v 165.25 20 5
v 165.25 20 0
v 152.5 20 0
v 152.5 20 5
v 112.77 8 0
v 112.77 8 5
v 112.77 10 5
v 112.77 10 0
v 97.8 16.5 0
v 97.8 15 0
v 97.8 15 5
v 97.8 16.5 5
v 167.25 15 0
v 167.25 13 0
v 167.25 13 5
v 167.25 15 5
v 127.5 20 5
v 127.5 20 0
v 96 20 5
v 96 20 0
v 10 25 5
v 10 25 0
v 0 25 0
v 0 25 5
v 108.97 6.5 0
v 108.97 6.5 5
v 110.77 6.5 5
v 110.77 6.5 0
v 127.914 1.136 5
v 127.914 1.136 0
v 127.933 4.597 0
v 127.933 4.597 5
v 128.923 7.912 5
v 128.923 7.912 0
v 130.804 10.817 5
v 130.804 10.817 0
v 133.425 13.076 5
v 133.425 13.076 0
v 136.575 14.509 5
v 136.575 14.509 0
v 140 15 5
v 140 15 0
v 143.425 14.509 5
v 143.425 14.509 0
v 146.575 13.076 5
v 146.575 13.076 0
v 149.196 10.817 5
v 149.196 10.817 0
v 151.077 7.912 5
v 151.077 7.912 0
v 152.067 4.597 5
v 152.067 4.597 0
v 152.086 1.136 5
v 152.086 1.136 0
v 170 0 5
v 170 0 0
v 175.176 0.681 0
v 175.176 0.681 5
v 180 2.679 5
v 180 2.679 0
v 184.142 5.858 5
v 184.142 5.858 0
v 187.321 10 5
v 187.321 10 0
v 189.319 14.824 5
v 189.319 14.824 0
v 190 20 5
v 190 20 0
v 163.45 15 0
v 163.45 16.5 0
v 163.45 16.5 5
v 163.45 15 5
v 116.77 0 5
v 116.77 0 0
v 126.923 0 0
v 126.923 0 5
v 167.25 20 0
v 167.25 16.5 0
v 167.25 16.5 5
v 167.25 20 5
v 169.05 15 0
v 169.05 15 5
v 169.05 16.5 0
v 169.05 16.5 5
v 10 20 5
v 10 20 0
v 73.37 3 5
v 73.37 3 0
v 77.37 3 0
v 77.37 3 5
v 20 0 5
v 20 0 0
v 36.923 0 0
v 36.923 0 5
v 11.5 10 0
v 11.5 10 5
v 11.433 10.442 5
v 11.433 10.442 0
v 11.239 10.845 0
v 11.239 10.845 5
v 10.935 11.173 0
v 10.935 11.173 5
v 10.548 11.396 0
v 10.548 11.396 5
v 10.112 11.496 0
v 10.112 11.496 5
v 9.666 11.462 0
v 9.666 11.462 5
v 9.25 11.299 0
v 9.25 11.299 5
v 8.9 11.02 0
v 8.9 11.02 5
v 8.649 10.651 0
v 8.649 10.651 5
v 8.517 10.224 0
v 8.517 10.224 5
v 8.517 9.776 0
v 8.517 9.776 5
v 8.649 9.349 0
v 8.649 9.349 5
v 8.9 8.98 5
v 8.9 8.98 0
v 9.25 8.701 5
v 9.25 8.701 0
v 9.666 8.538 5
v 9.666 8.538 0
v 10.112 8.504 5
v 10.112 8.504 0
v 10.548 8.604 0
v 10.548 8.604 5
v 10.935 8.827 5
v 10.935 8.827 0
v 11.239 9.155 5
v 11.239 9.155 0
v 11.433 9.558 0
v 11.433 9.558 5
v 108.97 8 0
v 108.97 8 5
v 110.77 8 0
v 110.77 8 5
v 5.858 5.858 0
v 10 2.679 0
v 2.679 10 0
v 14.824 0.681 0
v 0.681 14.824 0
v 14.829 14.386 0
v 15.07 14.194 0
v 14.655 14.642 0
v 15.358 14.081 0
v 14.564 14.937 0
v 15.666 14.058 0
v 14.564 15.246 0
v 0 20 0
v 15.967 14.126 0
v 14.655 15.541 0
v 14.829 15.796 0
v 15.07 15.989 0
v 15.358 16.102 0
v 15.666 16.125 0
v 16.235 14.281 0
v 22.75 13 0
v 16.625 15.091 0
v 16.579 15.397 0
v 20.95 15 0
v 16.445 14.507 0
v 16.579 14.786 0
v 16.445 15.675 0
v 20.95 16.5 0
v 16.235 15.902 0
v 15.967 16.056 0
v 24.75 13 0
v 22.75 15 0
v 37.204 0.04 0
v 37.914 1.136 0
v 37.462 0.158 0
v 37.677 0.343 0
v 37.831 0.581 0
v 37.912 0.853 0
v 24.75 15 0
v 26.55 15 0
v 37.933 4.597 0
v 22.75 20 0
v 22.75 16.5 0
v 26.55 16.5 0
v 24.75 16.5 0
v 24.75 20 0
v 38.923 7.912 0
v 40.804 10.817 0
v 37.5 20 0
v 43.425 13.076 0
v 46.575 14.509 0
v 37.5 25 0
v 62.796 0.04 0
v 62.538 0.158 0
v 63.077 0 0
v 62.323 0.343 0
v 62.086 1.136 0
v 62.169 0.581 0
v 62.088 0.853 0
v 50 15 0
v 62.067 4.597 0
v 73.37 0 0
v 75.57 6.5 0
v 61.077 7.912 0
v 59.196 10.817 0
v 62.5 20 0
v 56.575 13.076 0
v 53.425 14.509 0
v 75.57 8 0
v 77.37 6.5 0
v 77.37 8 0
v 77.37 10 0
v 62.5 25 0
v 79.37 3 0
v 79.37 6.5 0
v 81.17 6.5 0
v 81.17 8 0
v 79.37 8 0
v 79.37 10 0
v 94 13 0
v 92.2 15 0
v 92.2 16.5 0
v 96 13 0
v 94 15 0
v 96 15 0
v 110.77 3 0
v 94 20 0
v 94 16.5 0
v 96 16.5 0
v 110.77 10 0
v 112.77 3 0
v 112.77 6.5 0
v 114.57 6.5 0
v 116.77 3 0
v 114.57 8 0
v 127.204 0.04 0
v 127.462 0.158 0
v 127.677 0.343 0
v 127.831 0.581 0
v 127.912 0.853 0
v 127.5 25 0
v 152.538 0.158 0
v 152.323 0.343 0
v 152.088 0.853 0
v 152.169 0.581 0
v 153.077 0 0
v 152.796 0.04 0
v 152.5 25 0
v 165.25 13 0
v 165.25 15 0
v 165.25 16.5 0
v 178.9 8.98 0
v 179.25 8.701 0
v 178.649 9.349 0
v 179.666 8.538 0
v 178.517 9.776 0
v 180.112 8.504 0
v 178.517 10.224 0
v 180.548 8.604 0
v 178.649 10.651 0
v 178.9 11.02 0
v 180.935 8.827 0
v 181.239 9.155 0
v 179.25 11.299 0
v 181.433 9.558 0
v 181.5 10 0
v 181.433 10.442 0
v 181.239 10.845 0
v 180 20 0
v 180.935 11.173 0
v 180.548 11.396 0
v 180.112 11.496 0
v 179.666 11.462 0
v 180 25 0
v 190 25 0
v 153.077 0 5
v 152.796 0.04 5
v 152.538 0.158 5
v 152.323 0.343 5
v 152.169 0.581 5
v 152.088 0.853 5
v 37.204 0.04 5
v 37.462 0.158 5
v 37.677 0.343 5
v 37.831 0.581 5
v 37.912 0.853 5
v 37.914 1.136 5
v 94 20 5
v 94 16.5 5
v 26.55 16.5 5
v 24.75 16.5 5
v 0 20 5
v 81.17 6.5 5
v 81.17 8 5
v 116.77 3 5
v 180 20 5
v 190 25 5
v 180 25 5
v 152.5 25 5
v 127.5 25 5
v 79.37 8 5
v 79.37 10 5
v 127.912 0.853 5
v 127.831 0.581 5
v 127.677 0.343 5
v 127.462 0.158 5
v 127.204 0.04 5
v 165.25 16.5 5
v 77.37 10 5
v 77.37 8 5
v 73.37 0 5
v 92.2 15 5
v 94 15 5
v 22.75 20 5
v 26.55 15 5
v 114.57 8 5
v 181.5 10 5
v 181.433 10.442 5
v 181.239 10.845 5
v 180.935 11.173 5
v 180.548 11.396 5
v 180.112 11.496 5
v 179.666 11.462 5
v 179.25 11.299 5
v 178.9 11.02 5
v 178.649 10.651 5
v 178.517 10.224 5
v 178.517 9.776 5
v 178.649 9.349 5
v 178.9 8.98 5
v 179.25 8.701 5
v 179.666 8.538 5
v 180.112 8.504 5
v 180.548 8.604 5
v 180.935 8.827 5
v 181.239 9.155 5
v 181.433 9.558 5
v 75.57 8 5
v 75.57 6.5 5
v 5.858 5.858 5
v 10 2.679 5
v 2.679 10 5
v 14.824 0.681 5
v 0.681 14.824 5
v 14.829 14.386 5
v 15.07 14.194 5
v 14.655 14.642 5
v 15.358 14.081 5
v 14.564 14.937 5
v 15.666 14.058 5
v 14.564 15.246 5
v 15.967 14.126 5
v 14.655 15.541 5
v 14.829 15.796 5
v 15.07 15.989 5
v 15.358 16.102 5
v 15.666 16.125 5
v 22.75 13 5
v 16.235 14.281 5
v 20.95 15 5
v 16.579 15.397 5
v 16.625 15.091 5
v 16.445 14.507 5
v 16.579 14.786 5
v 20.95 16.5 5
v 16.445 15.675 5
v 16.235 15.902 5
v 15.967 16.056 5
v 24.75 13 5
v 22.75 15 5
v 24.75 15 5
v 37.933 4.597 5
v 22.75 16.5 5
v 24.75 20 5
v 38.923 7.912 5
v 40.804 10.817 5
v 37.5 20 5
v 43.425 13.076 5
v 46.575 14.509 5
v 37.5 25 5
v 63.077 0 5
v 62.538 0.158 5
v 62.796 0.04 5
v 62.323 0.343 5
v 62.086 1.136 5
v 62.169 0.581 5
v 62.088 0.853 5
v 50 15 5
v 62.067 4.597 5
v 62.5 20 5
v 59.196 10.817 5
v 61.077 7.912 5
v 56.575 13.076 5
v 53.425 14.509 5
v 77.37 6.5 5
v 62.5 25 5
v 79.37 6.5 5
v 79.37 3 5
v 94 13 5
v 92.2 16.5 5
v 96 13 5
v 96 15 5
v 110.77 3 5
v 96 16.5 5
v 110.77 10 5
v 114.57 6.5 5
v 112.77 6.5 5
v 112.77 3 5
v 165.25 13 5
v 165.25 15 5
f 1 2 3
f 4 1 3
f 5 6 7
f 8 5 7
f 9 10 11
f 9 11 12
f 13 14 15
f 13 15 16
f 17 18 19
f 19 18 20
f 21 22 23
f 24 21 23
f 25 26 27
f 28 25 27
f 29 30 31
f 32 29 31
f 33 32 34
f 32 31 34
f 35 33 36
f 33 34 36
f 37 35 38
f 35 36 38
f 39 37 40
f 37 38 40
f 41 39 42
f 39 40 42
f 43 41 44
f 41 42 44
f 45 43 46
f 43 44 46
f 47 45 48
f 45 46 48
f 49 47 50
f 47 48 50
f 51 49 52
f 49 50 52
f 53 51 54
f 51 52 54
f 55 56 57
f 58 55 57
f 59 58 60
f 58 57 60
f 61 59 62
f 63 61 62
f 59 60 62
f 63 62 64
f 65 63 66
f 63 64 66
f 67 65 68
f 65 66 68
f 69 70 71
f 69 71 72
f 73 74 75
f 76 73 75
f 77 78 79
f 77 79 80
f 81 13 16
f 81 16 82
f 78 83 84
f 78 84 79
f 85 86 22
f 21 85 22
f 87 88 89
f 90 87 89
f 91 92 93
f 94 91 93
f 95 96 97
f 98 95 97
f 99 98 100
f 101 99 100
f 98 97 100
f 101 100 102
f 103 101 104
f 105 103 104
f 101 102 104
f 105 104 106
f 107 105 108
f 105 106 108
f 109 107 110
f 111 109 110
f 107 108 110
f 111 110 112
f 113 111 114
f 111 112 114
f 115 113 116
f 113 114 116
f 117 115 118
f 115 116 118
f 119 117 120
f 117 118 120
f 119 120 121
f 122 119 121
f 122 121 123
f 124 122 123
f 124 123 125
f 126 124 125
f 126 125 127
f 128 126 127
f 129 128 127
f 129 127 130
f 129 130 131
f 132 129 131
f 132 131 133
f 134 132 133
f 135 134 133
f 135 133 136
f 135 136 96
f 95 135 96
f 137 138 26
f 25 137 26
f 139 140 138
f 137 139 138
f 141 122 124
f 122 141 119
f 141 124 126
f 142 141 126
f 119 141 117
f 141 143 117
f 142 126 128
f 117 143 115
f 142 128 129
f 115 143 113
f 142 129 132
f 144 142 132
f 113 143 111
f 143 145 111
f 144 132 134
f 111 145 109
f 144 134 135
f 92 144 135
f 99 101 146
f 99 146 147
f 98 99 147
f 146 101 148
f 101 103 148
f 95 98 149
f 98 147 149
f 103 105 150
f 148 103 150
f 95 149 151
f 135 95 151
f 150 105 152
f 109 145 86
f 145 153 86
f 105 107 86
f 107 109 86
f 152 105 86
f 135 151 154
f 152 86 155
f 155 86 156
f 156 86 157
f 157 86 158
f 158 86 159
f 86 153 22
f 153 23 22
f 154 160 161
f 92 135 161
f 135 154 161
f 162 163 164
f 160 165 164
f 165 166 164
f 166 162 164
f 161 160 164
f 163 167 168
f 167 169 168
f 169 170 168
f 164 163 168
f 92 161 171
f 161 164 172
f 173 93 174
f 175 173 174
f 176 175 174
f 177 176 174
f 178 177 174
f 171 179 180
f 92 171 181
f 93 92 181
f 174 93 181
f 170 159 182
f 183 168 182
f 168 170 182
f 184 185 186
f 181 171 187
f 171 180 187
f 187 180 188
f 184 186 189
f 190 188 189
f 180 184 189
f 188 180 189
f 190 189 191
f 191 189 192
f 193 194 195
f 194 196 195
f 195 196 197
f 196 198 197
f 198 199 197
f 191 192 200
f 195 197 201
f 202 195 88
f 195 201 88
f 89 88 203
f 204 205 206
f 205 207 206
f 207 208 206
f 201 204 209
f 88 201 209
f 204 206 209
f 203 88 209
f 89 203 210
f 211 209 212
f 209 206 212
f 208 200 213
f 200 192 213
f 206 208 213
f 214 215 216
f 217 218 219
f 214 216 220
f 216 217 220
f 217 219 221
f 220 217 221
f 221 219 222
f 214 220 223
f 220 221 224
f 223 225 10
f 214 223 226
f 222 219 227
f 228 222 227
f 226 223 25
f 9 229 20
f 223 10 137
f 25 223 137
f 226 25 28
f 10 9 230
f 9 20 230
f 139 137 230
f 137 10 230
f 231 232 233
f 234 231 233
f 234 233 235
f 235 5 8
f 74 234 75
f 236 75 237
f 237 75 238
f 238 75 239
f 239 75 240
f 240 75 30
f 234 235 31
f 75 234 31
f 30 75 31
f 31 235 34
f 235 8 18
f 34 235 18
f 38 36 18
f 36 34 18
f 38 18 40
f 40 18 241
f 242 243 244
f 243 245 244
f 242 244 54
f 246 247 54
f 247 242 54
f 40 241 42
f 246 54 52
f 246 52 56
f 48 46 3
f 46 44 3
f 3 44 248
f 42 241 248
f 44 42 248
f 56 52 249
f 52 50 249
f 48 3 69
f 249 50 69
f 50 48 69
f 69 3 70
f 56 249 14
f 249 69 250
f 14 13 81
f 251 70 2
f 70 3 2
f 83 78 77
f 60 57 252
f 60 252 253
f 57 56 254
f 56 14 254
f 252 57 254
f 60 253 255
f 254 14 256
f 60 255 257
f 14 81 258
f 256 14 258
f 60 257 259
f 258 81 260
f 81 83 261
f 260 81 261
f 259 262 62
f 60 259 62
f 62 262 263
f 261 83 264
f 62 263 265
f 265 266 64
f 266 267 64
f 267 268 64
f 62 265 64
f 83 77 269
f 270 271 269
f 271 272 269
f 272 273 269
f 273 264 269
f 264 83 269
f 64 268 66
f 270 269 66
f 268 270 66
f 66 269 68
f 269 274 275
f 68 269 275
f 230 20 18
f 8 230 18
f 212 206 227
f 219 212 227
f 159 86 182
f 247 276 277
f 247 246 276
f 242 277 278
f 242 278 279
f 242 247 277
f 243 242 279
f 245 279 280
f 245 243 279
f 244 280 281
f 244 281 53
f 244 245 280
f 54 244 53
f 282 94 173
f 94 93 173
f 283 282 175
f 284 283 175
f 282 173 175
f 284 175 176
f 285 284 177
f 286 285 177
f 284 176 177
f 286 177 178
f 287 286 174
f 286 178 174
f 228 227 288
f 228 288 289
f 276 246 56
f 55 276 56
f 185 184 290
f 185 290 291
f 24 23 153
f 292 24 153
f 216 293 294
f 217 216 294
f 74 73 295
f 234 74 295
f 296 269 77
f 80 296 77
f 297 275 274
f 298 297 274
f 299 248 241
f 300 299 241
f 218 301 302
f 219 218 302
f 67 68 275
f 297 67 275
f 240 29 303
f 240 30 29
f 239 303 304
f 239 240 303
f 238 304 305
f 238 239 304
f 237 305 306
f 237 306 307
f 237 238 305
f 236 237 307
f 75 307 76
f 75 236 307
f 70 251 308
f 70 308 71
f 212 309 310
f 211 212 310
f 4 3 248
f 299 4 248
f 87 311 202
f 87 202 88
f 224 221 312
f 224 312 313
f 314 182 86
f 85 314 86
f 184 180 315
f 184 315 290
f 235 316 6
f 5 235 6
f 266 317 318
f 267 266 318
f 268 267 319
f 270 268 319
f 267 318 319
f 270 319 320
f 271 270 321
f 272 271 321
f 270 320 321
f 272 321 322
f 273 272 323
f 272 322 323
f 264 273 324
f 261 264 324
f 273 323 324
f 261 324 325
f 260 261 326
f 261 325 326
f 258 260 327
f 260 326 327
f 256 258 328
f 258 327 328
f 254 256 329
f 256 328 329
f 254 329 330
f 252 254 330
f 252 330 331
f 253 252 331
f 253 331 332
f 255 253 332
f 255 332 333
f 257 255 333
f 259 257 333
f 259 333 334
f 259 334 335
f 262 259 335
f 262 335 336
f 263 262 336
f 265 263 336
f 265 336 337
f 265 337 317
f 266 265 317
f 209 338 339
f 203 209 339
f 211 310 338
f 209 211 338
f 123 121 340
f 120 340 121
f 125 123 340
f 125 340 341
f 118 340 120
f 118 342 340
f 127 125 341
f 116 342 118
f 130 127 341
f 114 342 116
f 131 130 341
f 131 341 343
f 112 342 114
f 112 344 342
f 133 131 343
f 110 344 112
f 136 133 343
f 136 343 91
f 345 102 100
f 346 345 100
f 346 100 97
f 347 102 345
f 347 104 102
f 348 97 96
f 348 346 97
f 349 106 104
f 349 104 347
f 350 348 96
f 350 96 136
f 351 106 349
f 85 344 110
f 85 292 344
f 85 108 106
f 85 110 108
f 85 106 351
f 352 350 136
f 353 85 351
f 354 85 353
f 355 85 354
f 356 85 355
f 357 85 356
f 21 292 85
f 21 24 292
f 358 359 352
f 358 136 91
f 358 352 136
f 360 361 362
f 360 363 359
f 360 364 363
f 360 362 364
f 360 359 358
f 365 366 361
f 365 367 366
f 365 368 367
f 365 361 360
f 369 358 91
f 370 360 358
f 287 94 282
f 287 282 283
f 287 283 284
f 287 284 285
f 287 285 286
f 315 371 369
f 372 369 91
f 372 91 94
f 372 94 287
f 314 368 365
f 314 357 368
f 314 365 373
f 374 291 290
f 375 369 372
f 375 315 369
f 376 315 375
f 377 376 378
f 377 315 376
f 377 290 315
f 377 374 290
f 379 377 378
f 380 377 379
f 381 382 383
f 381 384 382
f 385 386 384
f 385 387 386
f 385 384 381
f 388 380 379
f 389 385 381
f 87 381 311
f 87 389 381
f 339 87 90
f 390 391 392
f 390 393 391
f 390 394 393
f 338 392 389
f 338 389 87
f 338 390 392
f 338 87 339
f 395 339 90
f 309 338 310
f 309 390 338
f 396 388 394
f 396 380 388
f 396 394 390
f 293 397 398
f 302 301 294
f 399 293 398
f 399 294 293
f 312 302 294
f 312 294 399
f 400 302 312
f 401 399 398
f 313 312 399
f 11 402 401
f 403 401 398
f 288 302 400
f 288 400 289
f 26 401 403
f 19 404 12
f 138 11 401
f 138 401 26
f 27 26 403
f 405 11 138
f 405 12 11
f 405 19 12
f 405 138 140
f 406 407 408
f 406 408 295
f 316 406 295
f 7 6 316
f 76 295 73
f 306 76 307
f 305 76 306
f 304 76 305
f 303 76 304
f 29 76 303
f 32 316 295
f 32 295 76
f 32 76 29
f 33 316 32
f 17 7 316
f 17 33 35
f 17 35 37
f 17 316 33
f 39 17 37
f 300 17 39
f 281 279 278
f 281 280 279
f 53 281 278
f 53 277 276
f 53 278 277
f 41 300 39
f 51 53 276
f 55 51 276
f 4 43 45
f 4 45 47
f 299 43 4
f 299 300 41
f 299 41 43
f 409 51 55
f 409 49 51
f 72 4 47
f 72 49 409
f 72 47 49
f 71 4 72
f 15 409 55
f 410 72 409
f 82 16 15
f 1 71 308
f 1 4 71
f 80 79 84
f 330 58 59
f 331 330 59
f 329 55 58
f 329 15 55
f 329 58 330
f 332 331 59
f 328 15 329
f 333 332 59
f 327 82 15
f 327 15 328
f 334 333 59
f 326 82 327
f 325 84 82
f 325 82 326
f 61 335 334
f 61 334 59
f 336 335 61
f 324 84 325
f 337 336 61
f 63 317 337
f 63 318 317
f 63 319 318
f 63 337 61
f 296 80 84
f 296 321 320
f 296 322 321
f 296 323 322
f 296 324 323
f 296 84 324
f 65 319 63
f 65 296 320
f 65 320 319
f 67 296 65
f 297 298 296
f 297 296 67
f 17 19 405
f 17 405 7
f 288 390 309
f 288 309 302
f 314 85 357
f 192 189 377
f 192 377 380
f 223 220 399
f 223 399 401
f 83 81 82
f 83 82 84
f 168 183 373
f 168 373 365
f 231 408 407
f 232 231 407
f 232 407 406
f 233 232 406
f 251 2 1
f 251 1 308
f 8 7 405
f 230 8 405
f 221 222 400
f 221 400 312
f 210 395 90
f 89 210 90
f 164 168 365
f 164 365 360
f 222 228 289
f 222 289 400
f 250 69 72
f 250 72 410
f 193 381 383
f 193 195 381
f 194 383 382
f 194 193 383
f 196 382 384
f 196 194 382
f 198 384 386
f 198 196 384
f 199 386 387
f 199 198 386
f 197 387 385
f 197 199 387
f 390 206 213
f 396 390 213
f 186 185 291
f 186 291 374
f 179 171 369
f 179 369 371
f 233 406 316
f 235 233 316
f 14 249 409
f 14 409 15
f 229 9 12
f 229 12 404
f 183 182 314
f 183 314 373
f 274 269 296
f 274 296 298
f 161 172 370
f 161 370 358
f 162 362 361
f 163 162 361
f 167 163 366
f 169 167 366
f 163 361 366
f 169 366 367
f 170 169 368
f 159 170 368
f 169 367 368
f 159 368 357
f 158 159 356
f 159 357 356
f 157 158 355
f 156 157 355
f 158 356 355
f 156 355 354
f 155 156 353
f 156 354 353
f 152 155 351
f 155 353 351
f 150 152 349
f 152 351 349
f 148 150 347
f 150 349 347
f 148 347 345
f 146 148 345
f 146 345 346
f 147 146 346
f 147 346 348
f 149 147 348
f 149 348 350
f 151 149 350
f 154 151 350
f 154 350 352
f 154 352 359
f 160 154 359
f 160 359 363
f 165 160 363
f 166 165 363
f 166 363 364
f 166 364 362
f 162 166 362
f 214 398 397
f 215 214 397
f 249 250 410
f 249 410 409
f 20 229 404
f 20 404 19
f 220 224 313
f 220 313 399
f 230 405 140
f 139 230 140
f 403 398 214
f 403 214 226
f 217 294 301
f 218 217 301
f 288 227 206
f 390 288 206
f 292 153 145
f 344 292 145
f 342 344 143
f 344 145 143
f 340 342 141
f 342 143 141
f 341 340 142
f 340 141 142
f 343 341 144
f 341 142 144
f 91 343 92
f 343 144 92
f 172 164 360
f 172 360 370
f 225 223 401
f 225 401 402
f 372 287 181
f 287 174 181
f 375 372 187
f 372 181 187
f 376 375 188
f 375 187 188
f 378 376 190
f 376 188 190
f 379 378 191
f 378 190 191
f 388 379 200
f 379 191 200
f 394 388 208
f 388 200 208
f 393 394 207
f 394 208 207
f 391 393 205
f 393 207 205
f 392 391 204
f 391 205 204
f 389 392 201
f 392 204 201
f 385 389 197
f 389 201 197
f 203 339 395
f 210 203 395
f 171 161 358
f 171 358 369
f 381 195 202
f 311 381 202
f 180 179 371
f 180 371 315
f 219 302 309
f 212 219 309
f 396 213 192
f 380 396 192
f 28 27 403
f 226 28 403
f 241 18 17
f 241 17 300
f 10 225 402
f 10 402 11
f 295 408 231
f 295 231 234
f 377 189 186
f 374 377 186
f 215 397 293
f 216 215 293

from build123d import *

# Parameters (mm, degrees)
RESSALTO_EXTRUS_O1_DEPTH = 5
ESBO_O2_R                = 12.2
CORTE_EXTRUS_O1_DEPTH    = 6
FILETE1_R                = 1
ESBO_O3_W                = 27.5
ESBO_O3_H                = 5
ESBO_O3_W_2              = 65
CORTE_EXTRUS_O2_DEPTH    = 6
CORTE_EXTRUS_O3_DEPTH    = 6
ESBO_O5_R                = 1.5
ESBO_O5_R_2              = 1.036414637
CORTE_EXTRUS_O4_DEPTH    = 6
ESBO_O6_W                = 43.400181399
ESBO_O6_H                = 3
CORTE_EXTRUS_O5_DEPTH    = 6


with BuildPart() as part:
    # Esboço1 → Ressalto-extrusão1 (new body)
    with BuildSketch(Plane.XY):
        with BuildLine():
            Line((20, 0), (170, 0))
            ThreePointArc((170, 0), (184.142135624, 5.857864376), (190, 20))
            Line((190, 20), (190, 25))
            Line((190, 25), (0, 25))
            Line((0, 25), (0, 20))
            ThreePointArc((0, 20), (5.857864376, 5.857864376), (20, 0))
        make_face()
    extrude(amount=RESSALTO_EXTRUS_O1_DEPTH)

    # Esboço2 → Corte-extrusão1 (cut, through all)
    with BuildSketch(Plane(origin=(0, 0, 0), x_dir=(-1, 0, 0), z_dir=(0, 0, -1))):
        with Locations((-50, 2.8)):
            Circle(ESBO_O2_R)
        with Locations((-140, 2.8)):
            Circle(ESBO_O2_R)
    extrude(amount=-CORTE_EXTRUS_O1_DEPTH, mode=Mode.SUBTRACT)

    # Filete1
    filete1_edges = [part.edges().sort_by_distance(p)[0] for p in [
        (61.874342087, 0, 2.5),
        (38.125657913, 0, 2.5),
        (151.874342087, 0, 2.5),
        (128.125657913, 0, 2.5),
    ]]
    fillet(filete1_edges, radius=FILETE1_R)

    # Esboço3 → Corte-extrusão2 (cut, through all)
    with BuildSketch(Plane(origin=(0, 0, 0), x_dir=(-1, 0, 0), z_dir=(0, 0, -1))):
        with Locations((-166.25, 22.5)):
            Rectangle(ESBO_O3_W, ESBO_O3_H)
        with Locations((-95, 22.5)):
            Rectangle(ESBO_O3_W_2, ESBO_O3_H)
        with Locations((-23.75, 22.5)):
            Rectangle(ESBO_O3_W, ESBO_O3_H)
    extrude(amount=-CORTE_EXTRUS_O2_DEPTH, mode=Mode.SUBTRACT)

    # Esboço4 → Corte-extrusão3 (cut, through all)
    with BuildSketch(Plane(origin=(0, 0, 0), x_dir=(-1, 0, 0), z_dir=(0, 0, -1))):
        Polygon((-24.75, 13), (-24.75, 15), (-26.55, 15), (-26.55, 16.5), (-24.75, 16.5), (-24.75, 20), (-22.75, 20), (-22.75, 16.5), (-20.95, 16.5), (-20.95, 15), (-22.75, 15), (-22.75, 13), align=None)
        Polygon((-96, 13), (-96, 15), (-97.8, 15), (-97.8, 16.5), (-96, 16.5), (-96, 20), (-94, 20), (-94, 16.5), (-92.2, 16.5), (-92.2, 15), (-94, 15), (-94, 13), align=None)
        Polygon((-167.25, 13), (-167.25, 15), (-169.05, 15), (-169.05, 16.5), (-167.25, 16.5), (-167.25, 20), (-165.25, 20), (-165.25, 16.5), (-163.45, 16.5), (-163.45, 15), (-165.25, 15), (-165.25, 13), align=None)
    extrude(amount=-CORTE_EXTRUS_O3_DEPTH, mode=Mode.SUBTRACT)

    # Esboço5 → Corte-extrusão4 (cut, through all)
    with BuildSketch(Plane.XY.offset(5)):
        with Locations((180, 10)):
            Circle(ESBO_O5_R)
        with Locations((10, 10)):
            Circle(ESBO_O5_R)
        with Locations((15.588408084, 15.09127059)):
            Circle(ESBO_O5_R_2)
    extrude(amount=-CORTE_EXTRUS_O4_DEPTH, mode=Mode.SUBTRACT)

    # Esboço6 → Corte-extrusão5 (cut, through all)
    with BuildSketch(Plane.XY.offset(5)):
        Polygon((77.369700901, 6.5), (77.369700901, 3), (79.369700901, 3), (79.369700901, 6.5), (81.169700901, 6.5), (81.169700901, 8), (79.369700901, 8), (79.369700901, 10), (77.369700901, 10), (77.369700901, 8), (75.569700901, 8), (75.569700901, 6.5), align=None)
        with Locations((95.0697916, 1.5)):
            Rectangle(ESBO_O6_W, ESBO_O6_H)
        Polygon((110.7698823, 3), (112.7698823, 3), (112.7698823, 6.5), (114.5698823, 6.5), (114.5698823, 8), (112.7698823, 8), (112.7698823, 10), (110.7698823, 10), (110.7698823, 8), (108.9698823, 8), (108.9698823, 6.5), (110.7698823, 6.5), align=None)
    extrude(amount=-CORTE_EXTRUS_O5_DEPTH, mode=Mode.SUBTRACT)


solid = part.part
